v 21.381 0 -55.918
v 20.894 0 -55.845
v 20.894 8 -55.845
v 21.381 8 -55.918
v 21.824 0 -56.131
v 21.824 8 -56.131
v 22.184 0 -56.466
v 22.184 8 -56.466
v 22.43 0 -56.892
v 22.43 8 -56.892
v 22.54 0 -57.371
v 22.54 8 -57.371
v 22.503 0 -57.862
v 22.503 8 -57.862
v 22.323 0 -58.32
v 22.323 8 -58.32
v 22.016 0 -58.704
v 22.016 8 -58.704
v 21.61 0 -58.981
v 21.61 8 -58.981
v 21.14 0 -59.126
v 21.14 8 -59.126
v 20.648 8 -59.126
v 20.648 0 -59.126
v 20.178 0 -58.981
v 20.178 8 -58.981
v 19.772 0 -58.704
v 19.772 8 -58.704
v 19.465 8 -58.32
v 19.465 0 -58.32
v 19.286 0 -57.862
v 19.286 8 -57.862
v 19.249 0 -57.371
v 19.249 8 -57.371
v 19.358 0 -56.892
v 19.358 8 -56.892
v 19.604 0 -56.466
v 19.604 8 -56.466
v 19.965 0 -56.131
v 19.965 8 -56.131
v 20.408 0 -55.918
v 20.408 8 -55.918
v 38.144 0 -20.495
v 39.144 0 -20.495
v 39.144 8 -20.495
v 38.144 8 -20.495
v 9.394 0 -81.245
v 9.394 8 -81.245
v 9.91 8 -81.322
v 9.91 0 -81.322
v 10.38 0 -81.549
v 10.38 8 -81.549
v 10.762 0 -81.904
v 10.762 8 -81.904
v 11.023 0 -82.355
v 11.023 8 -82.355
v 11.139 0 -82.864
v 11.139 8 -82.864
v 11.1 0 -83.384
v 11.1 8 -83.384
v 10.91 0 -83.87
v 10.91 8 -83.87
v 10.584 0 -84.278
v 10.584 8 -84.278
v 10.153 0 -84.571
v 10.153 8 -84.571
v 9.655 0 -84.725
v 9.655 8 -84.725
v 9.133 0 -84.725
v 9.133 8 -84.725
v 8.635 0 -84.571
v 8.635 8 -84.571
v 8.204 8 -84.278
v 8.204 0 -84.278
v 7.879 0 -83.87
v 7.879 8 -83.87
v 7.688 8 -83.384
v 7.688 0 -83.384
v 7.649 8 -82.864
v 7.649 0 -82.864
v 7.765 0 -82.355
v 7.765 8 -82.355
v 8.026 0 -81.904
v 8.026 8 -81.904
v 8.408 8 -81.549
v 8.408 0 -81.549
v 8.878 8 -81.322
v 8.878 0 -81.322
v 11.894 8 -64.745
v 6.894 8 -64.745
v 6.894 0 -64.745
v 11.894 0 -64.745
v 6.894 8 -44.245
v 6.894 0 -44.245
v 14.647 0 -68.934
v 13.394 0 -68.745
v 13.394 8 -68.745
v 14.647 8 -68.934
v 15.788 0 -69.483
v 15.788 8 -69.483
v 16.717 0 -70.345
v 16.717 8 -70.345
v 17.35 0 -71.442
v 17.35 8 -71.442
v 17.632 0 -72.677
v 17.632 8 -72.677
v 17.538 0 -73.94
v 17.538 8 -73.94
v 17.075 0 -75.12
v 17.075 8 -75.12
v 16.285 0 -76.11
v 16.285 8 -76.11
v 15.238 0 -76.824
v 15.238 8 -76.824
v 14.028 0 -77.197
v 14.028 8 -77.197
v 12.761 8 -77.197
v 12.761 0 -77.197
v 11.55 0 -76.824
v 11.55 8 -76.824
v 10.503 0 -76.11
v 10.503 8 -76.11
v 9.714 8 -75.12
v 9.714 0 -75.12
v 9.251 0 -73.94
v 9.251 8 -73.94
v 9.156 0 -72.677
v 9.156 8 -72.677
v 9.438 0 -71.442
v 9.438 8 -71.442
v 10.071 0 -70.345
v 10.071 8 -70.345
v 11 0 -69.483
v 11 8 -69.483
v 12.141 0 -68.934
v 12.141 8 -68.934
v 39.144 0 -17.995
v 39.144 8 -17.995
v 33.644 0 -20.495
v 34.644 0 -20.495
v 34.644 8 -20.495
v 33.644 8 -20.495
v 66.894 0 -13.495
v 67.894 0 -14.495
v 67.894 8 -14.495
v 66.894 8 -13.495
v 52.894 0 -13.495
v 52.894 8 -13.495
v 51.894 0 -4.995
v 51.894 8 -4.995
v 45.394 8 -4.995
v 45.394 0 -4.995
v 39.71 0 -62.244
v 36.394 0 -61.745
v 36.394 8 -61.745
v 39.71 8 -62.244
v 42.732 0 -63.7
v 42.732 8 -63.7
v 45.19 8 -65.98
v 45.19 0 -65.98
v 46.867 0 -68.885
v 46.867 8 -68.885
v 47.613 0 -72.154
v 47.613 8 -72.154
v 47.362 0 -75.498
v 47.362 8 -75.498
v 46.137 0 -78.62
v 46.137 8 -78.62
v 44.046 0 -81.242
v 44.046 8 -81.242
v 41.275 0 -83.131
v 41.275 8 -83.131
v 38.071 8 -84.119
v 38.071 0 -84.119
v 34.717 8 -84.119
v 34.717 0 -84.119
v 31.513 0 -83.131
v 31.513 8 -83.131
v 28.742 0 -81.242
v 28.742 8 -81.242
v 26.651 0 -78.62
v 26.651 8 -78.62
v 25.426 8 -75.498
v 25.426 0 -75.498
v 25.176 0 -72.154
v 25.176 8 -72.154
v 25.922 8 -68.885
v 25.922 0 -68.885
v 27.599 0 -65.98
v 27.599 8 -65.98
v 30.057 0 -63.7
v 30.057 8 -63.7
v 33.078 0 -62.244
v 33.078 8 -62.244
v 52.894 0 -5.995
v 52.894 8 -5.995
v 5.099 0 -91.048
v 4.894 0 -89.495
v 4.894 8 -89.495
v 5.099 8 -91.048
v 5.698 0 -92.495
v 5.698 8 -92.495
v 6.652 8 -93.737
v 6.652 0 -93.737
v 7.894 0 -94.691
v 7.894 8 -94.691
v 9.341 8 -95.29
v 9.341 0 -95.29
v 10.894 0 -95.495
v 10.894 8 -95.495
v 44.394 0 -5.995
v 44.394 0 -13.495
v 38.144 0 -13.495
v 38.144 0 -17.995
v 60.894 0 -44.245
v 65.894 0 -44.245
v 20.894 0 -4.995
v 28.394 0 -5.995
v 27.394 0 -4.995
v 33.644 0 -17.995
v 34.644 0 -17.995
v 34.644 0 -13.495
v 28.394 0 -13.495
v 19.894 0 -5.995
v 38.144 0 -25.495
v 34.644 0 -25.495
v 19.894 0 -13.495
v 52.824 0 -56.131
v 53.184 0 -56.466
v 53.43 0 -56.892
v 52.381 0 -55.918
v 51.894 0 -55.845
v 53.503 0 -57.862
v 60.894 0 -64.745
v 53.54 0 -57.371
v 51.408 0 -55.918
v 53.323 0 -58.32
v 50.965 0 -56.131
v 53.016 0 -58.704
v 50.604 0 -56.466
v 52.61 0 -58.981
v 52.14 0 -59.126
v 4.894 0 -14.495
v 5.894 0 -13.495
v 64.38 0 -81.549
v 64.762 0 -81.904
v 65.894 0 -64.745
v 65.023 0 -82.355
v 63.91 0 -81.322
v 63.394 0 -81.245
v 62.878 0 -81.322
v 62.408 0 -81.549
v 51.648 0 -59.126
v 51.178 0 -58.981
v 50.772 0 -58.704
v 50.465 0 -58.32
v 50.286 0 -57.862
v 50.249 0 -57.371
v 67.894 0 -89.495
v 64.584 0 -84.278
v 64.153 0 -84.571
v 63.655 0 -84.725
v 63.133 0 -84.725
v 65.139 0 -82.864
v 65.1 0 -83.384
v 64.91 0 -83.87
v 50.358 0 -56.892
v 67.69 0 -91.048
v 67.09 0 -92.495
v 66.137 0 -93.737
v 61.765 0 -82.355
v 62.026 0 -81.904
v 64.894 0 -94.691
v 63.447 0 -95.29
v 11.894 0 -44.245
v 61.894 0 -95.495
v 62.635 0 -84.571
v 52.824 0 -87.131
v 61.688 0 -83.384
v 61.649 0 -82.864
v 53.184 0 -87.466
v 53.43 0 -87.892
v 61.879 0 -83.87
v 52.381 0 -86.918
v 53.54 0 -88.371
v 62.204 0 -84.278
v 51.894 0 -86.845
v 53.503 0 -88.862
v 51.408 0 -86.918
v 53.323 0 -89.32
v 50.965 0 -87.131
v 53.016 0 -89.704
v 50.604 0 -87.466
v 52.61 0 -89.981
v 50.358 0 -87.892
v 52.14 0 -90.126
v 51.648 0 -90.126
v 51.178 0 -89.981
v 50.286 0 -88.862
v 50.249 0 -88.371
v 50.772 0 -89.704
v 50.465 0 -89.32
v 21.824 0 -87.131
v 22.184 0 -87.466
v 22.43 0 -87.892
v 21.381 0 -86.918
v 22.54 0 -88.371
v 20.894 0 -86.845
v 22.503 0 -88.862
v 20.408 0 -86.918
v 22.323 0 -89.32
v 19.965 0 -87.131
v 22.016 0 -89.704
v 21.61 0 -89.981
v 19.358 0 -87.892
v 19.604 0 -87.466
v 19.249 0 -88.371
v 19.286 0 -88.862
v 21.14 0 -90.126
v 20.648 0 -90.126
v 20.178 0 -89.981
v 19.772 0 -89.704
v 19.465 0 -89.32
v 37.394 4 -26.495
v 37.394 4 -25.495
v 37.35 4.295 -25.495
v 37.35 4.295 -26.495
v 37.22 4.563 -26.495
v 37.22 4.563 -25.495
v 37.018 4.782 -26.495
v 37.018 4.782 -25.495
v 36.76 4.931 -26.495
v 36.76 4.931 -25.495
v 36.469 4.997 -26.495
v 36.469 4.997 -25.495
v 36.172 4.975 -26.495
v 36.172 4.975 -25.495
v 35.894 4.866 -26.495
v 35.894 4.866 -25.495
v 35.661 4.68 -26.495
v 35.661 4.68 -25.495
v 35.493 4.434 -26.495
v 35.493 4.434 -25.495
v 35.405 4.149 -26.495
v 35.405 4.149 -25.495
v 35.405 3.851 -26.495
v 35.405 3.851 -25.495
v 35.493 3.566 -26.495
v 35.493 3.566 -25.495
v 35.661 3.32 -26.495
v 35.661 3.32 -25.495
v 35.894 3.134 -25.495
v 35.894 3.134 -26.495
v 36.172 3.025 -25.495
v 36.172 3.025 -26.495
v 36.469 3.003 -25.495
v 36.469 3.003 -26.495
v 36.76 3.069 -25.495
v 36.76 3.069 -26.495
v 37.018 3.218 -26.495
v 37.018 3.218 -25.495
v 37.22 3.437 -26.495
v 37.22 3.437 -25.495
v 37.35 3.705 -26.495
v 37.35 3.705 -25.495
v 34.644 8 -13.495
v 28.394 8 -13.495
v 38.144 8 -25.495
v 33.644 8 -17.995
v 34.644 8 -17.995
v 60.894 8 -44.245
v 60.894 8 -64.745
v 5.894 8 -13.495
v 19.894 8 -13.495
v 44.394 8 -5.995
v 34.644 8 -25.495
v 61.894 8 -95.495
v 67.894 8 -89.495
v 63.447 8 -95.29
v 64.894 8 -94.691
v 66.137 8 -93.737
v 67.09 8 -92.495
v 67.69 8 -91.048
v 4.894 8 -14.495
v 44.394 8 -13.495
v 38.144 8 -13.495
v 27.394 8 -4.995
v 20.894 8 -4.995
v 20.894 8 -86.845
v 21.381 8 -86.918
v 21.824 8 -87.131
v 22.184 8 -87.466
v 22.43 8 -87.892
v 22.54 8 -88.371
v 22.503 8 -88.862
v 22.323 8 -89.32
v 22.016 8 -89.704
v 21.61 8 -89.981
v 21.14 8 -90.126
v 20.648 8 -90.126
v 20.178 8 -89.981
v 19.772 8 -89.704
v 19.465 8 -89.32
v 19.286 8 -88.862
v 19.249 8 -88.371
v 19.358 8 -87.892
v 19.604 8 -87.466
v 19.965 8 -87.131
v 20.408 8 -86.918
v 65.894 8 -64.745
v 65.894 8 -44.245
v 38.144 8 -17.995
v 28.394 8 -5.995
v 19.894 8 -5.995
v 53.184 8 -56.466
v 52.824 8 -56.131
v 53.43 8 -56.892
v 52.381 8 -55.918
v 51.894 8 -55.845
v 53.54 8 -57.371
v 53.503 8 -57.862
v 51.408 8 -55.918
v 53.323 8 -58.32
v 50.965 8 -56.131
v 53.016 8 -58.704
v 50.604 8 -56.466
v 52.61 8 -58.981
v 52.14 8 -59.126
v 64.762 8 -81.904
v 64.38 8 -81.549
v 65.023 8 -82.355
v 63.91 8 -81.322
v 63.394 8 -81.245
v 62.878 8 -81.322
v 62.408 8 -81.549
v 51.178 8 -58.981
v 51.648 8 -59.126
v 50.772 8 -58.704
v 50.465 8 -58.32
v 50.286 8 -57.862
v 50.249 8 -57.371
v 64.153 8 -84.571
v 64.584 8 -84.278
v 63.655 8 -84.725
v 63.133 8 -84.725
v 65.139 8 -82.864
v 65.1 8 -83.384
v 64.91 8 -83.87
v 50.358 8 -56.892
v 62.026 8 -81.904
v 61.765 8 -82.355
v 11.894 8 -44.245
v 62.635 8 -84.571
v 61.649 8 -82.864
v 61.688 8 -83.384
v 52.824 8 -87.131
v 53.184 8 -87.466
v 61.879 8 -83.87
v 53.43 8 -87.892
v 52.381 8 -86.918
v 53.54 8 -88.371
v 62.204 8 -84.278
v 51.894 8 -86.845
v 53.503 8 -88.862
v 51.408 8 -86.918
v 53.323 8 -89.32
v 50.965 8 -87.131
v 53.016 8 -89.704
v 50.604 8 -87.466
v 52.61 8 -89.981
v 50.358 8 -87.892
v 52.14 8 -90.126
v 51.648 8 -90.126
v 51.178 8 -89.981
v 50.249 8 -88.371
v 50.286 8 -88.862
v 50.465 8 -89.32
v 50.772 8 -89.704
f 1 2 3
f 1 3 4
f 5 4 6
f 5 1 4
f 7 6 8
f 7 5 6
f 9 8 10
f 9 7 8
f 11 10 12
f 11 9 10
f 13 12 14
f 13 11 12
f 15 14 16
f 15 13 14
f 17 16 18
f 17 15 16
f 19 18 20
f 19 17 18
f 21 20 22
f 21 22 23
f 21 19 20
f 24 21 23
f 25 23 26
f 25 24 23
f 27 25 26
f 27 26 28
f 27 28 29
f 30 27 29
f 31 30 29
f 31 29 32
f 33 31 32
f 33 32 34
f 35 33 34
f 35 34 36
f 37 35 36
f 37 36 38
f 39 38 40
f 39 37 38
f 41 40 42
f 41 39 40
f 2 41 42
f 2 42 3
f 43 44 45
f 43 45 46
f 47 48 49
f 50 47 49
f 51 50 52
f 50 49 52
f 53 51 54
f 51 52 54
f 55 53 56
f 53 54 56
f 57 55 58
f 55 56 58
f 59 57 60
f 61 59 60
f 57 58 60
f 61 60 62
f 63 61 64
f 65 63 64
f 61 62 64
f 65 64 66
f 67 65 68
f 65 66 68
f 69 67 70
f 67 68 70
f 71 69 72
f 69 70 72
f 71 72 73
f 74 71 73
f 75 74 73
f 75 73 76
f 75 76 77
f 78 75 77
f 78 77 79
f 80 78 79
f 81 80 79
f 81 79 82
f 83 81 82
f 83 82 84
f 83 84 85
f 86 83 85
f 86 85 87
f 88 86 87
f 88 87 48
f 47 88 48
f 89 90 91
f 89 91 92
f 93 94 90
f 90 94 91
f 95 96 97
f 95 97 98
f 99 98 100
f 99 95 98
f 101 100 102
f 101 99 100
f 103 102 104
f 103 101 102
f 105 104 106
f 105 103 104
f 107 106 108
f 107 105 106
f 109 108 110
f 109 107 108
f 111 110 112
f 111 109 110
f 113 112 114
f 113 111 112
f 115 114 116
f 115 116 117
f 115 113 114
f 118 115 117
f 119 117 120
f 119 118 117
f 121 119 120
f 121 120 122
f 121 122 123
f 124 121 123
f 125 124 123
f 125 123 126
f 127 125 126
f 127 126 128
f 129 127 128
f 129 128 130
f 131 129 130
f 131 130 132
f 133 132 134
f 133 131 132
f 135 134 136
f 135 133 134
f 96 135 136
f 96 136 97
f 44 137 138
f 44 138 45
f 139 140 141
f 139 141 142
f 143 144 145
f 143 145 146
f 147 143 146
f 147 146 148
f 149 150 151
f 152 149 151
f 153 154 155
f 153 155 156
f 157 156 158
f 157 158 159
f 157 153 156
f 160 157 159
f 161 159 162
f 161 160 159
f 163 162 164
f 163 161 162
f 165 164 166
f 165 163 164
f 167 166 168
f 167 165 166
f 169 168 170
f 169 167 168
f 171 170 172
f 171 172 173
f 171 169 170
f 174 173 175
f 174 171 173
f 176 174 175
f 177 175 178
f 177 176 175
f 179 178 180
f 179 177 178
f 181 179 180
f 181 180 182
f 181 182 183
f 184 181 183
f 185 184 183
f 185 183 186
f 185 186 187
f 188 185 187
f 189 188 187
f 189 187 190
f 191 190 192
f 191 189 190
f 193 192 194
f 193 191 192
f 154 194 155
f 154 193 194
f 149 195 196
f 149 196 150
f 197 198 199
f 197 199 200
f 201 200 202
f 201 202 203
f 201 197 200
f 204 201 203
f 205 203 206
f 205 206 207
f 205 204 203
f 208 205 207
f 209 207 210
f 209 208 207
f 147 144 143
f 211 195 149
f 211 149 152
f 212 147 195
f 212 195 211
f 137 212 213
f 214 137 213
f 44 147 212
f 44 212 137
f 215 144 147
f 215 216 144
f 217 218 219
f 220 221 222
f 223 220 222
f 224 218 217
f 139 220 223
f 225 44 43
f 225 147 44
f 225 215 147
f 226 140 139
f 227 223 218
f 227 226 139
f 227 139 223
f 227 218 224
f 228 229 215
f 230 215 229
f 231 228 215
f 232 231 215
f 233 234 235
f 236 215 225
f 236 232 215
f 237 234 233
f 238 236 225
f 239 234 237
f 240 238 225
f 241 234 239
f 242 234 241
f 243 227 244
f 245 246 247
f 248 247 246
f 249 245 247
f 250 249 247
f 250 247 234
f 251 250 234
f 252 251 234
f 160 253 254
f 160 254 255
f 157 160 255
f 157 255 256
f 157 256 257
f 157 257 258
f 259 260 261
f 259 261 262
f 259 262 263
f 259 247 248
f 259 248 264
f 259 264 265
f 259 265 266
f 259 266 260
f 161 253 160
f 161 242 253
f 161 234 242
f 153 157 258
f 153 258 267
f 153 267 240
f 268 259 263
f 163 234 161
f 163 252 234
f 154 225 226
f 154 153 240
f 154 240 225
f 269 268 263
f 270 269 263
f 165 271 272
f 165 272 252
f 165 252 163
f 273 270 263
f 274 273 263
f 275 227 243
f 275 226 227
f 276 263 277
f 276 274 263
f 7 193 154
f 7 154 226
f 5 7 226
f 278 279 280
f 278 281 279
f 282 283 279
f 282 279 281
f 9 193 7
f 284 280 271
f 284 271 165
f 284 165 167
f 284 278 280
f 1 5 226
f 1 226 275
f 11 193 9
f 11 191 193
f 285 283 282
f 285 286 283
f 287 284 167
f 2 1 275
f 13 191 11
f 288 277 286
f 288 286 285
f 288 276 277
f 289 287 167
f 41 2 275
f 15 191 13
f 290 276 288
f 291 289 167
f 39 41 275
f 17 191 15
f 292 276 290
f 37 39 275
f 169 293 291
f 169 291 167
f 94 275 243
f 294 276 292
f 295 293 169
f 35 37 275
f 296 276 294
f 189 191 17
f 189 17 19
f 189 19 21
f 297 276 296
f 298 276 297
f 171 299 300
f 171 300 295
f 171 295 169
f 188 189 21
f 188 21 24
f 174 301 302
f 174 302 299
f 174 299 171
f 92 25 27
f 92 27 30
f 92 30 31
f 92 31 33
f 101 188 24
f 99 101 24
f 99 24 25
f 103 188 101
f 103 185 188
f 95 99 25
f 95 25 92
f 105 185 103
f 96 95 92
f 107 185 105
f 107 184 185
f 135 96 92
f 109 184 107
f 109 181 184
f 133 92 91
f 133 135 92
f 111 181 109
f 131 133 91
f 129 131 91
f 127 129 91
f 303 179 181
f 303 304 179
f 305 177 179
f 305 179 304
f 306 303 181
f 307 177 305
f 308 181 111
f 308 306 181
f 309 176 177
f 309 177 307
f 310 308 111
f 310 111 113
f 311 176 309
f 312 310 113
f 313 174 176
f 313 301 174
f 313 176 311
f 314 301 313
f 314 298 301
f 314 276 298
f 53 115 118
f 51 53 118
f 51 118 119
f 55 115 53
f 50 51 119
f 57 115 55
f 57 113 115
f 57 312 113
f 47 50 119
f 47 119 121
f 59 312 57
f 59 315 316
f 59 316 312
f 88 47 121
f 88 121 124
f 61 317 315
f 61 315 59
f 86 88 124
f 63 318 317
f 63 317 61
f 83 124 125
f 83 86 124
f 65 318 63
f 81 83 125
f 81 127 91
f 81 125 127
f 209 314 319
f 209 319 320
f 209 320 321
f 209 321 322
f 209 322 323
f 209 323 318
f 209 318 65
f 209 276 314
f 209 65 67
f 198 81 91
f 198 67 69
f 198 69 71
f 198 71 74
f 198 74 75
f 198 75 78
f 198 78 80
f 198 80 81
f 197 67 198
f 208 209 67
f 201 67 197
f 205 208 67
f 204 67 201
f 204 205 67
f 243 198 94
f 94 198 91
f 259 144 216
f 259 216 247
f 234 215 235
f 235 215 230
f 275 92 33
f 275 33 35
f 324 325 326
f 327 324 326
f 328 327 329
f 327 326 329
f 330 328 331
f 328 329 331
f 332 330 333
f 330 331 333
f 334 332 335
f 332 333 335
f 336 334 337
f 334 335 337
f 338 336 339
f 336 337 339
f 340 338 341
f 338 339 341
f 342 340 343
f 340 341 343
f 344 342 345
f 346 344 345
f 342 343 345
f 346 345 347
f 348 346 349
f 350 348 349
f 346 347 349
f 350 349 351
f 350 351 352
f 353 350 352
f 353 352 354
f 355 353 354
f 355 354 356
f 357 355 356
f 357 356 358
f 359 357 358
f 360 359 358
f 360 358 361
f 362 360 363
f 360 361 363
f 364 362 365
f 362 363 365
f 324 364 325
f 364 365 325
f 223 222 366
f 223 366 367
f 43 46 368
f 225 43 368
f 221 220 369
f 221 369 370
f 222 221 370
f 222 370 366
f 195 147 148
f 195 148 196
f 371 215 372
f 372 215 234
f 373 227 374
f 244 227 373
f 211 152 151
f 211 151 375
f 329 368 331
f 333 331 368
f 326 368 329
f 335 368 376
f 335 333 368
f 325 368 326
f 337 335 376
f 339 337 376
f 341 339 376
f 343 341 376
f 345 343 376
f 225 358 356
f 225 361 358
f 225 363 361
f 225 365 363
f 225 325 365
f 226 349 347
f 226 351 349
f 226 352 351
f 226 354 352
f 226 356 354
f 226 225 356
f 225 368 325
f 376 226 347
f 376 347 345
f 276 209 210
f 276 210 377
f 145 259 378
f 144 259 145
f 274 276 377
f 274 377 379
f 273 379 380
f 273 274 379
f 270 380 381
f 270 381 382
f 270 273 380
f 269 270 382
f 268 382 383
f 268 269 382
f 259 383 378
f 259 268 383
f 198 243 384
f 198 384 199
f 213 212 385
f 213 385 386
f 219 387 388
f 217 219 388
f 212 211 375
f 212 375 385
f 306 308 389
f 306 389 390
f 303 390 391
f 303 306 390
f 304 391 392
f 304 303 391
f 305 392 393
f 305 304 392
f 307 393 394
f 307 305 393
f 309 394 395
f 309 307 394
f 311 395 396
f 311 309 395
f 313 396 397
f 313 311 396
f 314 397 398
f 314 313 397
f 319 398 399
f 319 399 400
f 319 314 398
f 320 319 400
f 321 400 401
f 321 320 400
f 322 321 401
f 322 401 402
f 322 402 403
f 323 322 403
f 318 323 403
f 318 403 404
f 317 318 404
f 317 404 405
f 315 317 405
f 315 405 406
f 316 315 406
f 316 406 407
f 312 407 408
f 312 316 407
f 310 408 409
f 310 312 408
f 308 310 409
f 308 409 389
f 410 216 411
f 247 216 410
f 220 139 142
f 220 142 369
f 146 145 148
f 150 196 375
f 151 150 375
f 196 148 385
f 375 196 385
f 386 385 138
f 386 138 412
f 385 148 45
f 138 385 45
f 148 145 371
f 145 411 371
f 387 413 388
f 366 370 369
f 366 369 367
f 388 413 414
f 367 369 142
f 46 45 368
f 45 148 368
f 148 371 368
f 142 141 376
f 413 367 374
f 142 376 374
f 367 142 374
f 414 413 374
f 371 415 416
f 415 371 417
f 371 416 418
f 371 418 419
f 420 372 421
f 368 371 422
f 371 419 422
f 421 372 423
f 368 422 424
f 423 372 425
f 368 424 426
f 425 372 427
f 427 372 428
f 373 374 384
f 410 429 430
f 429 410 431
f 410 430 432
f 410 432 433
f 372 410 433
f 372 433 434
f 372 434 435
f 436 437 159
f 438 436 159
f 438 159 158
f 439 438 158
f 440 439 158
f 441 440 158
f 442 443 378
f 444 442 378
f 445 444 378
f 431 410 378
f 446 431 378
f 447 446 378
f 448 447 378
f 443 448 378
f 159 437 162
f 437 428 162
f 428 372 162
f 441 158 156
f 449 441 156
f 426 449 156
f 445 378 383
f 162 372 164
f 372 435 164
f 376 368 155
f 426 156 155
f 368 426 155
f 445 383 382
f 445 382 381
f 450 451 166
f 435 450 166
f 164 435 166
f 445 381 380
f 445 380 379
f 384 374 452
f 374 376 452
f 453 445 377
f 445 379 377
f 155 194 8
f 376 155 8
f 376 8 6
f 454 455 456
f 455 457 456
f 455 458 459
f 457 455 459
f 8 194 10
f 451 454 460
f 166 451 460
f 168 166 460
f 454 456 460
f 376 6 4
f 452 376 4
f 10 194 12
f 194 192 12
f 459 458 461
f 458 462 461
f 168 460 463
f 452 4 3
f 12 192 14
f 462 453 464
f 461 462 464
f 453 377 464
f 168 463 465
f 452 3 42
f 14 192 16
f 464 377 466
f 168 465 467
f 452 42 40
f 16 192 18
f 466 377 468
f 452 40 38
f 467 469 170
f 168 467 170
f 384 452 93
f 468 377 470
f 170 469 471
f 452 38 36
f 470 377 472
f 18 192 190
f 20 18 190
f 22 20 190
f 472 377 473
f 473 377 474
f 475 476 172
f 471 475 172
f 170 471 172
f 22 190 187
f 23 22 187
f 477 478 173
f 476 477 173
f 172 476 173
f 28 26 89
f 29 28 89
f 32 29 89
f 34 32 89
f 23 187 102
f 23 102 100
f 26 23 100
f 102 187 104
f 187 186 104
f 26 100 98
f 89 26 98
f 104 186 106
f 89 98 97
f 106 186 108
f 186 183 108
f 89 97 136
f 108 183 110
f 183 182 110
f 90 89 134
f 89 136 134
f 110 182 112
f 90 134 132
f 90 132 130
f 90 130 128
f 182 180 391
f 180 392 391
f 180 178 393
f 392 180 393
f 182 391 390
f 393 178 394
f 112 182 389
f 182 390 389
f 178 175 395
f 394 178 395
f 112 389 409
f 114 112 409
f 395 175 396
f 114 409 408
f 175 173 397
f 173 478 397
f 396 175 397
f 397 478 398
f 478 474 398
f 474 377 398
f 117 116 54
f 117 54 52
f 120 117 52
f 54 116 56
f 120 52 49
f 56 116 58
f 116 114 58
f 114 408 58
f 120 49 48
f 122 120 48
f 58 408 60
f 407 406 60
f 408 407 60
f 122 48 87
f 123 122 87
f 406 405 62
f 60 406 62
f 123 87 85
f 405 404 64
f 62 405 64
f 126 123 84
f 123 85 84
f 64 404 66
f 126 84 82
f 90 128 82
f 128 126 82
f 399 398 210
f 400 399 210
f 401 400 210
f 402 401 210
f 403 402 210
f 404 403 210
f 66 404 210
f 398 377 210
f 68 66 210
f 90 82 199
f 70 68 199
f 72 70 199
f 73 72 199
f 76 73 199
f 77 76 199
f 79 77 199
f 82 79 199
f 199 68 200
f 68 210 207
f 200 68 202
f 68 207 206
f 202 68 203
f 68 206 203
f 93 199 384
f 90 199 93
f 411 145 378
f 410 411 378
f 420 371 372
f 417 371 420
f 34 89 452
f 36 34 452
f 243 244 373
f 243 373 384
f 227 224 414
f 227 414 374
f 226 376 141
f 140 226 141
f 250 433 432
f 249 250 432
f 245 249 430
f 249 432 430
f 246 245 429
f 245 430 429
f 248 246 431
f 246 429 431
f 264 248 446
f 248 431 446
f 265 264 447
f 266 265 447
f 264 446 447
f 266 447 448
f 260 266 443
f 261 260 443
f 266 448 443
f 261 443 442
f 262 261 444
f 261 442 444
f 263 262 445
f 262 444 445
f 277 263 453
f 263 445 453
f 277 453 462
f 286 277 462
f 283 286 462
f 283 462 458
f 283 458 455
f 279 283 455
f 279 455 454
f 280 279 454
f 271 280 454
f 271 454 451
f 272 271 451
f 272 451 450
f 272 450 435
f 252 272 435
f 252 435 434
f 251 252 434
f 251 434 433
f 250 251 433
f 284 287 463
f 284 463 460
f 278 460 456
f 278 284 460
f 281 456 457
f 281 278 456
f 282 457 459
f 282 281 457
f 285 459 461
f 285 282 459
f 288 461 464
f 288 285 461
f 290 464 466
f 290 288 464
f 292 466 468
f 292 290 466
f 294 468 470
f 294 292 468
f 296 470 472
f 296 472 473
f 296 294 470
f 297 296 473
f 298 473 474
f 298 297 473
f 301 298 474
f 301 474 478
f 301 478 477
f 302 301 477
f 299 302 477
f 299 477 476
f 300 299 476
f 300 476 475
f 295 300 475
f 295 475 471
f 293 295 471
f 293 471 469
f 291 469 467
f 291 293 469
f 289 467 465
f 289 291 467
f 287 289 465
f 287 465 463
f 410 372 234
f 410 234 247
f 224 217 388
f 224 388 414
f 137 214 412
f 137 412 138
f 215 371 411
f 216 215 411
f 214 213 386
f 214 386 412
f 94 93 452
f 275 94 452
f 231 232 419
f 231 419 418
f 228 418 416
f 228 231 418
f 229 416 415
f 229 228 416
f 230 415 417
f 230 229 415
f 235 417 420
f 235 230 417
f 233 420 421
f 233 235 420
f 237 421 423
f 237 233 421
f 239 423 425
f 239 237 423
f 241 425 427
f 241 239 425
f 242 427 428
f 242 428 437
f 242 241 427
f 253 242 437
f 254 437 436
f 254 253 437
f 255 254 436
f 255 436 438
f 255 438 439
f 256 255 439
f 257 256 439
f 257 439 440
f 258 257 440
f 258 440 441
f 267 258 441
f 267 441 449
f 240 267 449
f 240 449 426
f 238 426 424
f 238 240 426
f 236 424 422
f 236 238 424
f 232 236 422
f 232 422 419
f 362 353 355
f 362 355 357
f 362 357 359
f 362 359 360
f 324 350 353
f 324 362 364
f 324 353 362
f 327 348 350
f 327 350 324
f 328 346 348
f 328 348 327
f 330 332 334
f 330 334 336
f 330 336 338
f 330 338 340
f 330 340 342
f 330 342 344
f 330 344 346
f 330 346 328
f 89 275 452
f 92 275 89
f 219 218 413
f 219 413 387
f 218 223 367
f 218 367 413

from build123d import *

# Parameters (mm, degrees)
SKETCH1_R      = 4.25
SKETCH1_R_2    = 1.65
SKETCH1_R_3    = 11.25
SKETCH1_W      = 5
SKETCH1_H      = 20.5
EXTRUDE1_DEPTH = 8
SKETCH2_R      = 1
EXTRUDE2_DEPTH = 1
SKETCH3_R      = 1.75
EXTRUDE3_DEPTH = 10


with BuildPart() as part:
    # Sketch1 → Extrude1 (new body)
    with BuildSketch(Plane(origin=(0, 0, 0), x_dir=(1, 0, 0), z_dir=(0, 1, 0))):
        with BuildLine():
            Line((4.894189333, 14.494689664), (4.894189333, 89.494689664))
            ThreePointArc((4.894189333, 89.494689664), (6.651548646, 93.737330351), (10.894189333, 95.494689664))
            Line((10.894189333, 95.494689664), (61.894189333, 95.494689664))
            ThreePointArc((61.894189333, 95.494689664), (66.136830021, 93.737330351), (67.894189333, 89.494689664))
            Line((67.894189333, 89.494689664), (67.894189333, 14.494689664))
            Line((67.894189333, 14.494689664), (66.894189333, 13.494689664))
            Line((66.894189333, 13.494689664), (52.894189333, 13.494689664))
            Line((52.894189333, 13.494689664), (52.894189333, 5.994689664))
            Line((52.894189333, 5.994689664), (51.894189333, 4.994689664))
            Line((51.894189333, 4.994689664), (45.394189333, 4.994689664))
            Line((45.394189333, 4.994689664), (44.394189333, 5.994689664))
            Line((44.394189333, 5.994689664), (44.394189333, 13.494689664))
            Line((44.394189333, 13.494689664), (38.144189333, 13.494689664))
            Line((38.144189333, 13.494689664), (38.144189333, 17.994689664))
            Line((38.144189333, 17.994689664), (39.144189333, 17.994689664))
            Line((39.144189333, 17.994689664), (39.144189333, 20.494689664))
            Line((39.144189333, 20.494689664), (38.144189333, 20.494689664))
            Line((38.144189333, 20.494689664), (38.144189333, 25.494689664))
            Line((38.144189333, 25.494689664), (34.644189333, 25.494689664))
            Line((34.644189333, 25.494689664), (34.644189333, 20.494689664))
            Line((34.644189333, 20.494689664), (33.644189333, 20.494689664))
            Line((33.644189333, 20.494689664), (33.644189333, 17.994689664))
            Line((33.644189333, 17.994689664), (34.644189333, 17.994689664))
            Line((34.644189333, 17.994689664), (34.644189333, 13.494689664))
            Line((34.644189333, 13.494689664), (28.394189333, 13.494689664))
            Line((28.394189333, 13.494689664), (28.394189333, 5.994689664))
            Line((28.394189333, 5.994689664), (27.394189333, 4.994689664))
            Line((27.394189333, 4.994689664), (20.894189333, 4.994689664))
            Line((20.894189333, 4.994689664), (19.894189333, 5.994689664))
            Line((19.894189333, 5.994689664), (19.894189333, 13.494689664))
            Line((19.894189333, 13.494689664), (5.894189333, 13.494689664))
            Line((5.894189333, 13.494689664), (4.894189333, 14.494689664))
        make_face()
        with Locations(Location((13.394189333, 72.994689664, 0), (0, 0, 270))):
            Circle(SKETCH1_R, mode=Mode.SUBTRACT)
        with Locations(Location((51.894189333, 88.494689664, 0), (0, 0, 270))):
            Circle(SKETCH1_R_2, mode=Mode.SUBTRACT)
        with Locations(Location((20.894189333, 88.494689664, 0), (0, 0, 270))):
            Circle(SKETCH1_R_2, mode=Mode.SUBTRACT)
        with Locations(Location((51.894189333, 57.494689664, 0), (0, 0, 270))):
            Circle(SKETCH1_R_2, mode=Mode.SUBTRACT)
        with Locations(Location((20.894189333, 57.494689664, 0), (0, 0, 270))):
            Circle(SKETCH1_R_2, mode=Mode.SUBTRACT)
        with Locations(Location((36.394189333, 72.994689664, 0), (0, 0, 270))):
            Circle(SKETCH1_R_3, mode=Mode.SUBTRACT)
        with Locations((9.394189333, 54.494689664)):
            Rectangle(SKETCH1_W, SKETCH1_H, mode=Mode.SUBTRACT)
        with Locations((63.394189333, 54.494689664)):
            Rectangle(SKETCH1_W, SKETCH1_H, mode=Mode.SUBTRACT)
    extrude(amount=EXTRUDE1_DEPTH)

    # Sketch2 → Extrude2 (cut)
    with BuildSketch(Plane.XY.offset(-25.494689664)):
        with Locations((36.394189333, 4)):
            Circle(SKETCH2_R)
    extrude(amount=-EXTRUDE2_DEPTH, mode=Mode.SUBTRACT)

    # Sketch3 → Extrude3 (cut)
    with BuildSketch(Plane(origin=(0, 8, 0), x_dir=(1, 0, 0), z_dir=(0, 1, 0))):
        with Locations(Location((9.394189333, 82.994689664, 0), (0, 0, 270))):
            Circle(SKETCH3_R)
        with Locations(Location((63.394189333, 82.994689664, 0), (0, 0, 270))):
            Circle(SKETCH3_R)
    extrude(amount=-EXTRUDE3_DEPTH, mode=Mode.SUBTRACT)


solid = part.part
